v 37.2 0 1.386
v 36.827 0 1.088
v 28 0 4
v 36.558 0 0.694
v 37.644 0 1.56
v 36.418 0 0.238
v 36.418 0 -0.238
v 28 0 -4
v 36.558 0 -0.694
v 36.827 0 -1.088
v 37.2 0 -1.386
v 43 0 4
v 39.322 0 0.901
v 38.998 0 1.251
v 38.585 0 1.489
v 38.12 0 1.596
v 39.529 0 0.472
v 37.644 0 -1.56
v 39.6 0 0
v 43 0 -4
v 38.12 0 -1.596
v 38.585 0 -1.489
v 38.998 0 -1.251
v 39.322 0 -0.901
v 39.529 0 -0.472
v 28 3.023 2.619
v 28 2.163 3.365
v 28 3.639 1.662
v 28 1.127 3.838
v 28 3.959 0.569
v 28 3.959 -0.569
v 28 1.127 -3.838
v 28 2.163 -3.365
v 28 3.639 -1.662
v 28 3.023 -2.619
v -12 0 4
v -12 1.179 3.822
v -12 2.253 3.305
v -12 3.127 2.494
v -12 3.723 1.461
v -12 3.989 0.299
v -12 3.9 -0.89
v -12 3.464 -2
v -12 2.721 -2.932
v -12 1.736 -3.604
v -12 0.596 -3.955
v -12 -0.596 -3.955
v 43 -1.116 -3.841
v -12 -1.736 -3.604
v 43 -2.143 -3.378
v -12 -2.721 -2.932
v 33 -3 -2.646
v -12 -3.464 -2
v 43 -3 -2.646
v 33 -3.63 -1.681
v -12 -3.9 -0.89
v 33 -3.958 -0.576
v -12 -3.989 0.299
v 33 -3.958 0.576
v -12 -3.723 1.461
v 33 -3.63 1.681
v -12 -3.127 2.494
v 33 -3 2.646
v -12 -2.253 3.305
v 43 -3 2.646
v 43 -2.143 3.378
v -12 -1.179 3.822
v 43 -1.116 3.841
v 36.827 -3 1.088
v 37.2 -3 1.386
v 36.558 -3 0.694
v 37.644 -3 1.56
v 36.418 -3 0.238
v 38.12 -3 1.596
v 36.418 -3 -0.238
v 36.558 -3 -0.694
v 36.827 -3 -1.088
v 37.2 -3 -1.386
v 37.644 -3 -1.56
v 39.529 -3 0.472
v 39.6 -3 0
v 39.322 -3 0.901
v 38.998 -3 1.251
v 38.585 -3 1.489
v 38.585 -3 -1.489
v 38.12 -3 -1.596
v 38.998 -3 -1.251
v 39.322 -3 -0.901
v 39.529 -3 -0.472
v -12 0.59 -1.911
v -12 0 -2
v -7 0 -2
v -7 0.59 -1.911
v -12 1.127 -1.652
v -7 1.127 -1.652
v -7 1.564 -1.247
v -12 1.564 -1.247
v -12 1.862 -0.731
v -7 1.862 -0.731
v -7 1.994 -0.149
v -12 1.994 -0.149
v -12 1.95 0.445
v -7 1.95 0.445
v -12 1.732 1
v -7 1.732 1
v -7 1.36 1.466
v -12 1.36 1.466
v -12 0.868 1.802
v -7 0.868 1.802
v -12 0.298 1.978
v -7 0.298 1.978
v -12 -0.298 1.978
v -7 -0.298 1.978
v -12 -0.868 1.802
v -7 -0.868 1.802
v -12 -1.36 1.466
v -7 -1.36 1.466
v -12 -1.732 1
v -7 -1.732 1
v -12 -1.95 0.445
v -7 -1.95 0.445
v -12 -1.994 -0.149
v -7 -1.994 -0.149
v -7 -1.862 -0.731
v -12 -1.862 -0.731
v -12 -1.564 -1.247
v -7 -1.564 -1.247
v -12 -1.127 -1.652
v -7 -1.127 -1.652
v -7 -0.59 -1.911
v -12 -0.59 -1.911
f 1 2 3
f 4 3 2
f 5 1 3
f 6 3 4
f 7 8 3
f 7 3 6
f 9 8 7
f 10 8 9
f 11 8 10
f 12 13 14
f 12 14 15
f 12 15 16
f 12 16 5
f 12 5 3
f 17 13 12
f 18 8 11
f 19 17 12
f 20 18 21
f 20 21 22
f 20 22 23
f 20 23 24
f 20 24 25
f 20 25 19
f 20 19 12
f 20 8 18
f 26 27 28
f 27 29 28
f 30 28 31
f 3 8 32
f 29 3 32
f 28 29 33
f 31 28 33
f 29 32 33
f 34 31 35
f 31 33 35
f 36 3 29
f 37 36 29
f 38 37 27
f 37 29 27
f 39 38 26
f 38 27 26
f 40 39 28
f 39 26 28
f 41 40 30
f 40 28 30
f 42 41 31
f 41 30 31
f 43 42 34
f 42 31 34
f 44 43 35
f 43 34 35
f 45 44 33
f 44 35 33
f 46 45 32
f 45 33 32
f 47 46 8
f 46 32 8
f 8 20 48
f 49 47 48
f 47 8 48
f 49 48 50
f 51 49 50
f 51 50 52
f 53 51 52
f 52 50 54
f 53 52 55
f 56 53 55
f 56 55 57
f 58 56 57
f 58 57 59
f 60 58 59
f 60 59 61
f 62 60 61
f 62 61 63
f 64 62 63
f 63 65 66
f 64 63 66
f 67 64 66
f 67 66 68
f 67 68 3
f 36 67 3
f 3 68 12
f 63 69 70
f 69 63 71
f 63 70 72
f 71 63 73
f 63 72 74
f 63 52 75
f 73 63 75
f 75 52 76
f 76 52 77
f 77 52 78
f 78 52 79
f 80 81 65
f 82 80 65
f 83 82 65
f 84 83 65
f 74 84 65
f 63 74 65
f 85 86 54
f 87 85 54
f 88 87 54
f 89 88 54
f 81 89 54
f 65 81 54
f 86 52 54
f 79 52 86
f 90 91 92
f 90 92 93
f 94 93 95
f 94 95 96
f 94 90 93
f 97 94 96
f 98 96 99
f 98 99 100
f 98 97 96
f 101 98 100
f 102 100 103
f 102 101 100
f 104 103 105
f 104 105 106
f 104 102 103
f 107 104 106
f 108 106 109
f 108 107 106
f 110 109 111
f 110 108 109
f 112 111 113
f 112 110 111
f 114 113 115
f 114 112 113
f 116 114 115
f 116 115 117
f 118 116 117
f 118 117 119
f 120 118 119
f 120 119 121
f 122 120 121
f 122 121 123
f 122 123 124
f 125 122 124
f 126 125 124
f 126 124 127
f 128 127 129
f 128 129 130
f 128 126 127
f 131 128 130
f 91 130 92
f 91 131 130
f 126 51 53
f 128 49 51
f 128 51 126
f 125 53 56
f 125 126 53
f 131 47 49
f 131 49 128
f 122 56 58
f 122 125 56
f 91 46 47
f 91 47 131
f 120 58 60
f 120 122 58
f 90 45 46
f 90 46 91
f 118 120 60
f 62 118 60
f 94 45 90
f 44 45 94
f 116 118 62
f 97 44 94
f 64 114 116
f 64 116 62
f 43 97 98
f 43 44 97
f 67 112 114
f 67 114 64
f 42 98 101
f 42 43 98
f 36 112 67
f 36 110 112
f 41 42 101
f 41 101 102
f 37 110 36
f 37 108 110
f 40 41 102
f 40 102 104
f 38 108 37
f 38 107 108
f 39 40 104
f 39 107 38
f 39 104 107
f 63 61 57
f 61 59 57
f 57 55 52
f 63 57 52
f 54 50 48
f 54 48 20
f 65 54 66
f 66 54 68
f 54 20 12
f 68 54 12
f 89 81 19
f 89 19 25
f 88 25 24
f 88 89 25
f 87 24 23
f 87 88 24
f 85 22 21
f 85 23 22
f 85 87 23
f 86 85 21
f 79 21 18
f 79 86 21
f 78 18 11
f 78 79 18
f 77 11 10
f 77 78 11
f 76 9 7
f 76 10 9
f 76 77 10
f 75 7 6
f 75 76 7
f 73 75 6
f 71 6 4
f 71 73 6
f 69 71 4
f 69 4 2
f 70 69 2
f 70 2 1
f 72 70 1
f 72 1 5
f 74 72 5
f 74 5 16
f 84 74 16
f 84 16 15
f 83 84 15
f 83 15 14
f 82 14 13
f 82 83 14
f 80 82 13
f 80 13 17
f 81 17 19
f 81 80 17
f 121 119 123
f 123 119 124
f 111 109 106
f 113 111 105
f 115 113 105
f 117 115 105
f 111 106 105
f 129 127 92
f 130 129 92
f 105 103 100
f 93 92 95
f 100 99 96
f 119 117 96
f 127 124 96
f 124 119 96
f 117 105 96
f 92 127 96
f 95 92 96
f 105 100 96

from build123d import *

# Parameters (mm, degrees)
CYLINDER026_R      = 2
CYLINDER026_DEPTH  = 5
CYLINDER035_R      = 1.6
CYLINDER035_DEPTH  = 5
BOX015001017_W     = 10
BOX015001017_H     = 10
BOX015001017_DEPTH = 10
BOX015001016_W     = 15
BOX015001016_H     = 10
BOX015001016_DEPTH = 10
CYLINDER025_R      = 4
CYLINDER025_DEPTH  = 55


with BuildPart() as cylinder036:
    # Cylinder026 → Cylinder026 (new body)
    with BuildSketch(Plane(origin=(-12, 0, 0), x_dir=(0, 0, -1), z_dir=(1, 0, 0))):
        Circle(CYLINDER026_R)
    extrude(amount=CYLINDER026_DEPTH)


with BuildPart() as cylinder035:
    # Cylinder035 → Cylinder035 (new body)
    with BuildSketch(Plane(origin=(38, -4, 0), x_dir=(1, 0, 0), z_dir=(0, 1, 0))):
        Circle(CYLINDER035_R)
    extrude(amount=CYLINDER035_DEPTH)


with BuildPart() as cube020:
    # Box015001017 → Box015001017 (new body)
    with BuildSketch(Plane(origin=(33, -13, -5), x_dir=(1, 0, 0), z_dir=(0, 0, 1))):
        with Locations((5, 5)):
            Rectangle(BOX015001017_W, BOX015001017_H)
    extrude(amount=BOX015001017_DEPTH)


with BuildPart() as cube019:
    # Box015001016 → Box015001016 (new body)
    with BuildSketch(Plane(origin=(28, 0, -5), x_dir=(1, 0, 0), z_dir=(0, 0, 1))):
        with Locations((7.5, 5)):
            Rectangle(BOX015001016_W, BOX015001016_H)
    extrude(amount=BOX015001016_DEPTH)


with BuildPart() as piston:
    # Cylinder025 → Cylinder025 (new body)
    with BuildSketch(Plane.ZY.offset(-43)):
        Circle(CYLINDER025_R)
    extrude(amount=CYLINDER025_DEPTH)

    # Cut004030: cut Cube019
    add(cube019.part, mode=Mode.SUBTRACT)

    # Cut001: cut Cube020
    add(cube020.part, mode=Mode.SUBTRACT)

    # Cut004028: cut Cylinder035
    add(cylinder035.part, mode=Mode.SUBTRACT)

    # Cut003: cut Cylinder036
    add(cylinder036.part, mode=Mode.SUBTRACT)


solid = piston.part
